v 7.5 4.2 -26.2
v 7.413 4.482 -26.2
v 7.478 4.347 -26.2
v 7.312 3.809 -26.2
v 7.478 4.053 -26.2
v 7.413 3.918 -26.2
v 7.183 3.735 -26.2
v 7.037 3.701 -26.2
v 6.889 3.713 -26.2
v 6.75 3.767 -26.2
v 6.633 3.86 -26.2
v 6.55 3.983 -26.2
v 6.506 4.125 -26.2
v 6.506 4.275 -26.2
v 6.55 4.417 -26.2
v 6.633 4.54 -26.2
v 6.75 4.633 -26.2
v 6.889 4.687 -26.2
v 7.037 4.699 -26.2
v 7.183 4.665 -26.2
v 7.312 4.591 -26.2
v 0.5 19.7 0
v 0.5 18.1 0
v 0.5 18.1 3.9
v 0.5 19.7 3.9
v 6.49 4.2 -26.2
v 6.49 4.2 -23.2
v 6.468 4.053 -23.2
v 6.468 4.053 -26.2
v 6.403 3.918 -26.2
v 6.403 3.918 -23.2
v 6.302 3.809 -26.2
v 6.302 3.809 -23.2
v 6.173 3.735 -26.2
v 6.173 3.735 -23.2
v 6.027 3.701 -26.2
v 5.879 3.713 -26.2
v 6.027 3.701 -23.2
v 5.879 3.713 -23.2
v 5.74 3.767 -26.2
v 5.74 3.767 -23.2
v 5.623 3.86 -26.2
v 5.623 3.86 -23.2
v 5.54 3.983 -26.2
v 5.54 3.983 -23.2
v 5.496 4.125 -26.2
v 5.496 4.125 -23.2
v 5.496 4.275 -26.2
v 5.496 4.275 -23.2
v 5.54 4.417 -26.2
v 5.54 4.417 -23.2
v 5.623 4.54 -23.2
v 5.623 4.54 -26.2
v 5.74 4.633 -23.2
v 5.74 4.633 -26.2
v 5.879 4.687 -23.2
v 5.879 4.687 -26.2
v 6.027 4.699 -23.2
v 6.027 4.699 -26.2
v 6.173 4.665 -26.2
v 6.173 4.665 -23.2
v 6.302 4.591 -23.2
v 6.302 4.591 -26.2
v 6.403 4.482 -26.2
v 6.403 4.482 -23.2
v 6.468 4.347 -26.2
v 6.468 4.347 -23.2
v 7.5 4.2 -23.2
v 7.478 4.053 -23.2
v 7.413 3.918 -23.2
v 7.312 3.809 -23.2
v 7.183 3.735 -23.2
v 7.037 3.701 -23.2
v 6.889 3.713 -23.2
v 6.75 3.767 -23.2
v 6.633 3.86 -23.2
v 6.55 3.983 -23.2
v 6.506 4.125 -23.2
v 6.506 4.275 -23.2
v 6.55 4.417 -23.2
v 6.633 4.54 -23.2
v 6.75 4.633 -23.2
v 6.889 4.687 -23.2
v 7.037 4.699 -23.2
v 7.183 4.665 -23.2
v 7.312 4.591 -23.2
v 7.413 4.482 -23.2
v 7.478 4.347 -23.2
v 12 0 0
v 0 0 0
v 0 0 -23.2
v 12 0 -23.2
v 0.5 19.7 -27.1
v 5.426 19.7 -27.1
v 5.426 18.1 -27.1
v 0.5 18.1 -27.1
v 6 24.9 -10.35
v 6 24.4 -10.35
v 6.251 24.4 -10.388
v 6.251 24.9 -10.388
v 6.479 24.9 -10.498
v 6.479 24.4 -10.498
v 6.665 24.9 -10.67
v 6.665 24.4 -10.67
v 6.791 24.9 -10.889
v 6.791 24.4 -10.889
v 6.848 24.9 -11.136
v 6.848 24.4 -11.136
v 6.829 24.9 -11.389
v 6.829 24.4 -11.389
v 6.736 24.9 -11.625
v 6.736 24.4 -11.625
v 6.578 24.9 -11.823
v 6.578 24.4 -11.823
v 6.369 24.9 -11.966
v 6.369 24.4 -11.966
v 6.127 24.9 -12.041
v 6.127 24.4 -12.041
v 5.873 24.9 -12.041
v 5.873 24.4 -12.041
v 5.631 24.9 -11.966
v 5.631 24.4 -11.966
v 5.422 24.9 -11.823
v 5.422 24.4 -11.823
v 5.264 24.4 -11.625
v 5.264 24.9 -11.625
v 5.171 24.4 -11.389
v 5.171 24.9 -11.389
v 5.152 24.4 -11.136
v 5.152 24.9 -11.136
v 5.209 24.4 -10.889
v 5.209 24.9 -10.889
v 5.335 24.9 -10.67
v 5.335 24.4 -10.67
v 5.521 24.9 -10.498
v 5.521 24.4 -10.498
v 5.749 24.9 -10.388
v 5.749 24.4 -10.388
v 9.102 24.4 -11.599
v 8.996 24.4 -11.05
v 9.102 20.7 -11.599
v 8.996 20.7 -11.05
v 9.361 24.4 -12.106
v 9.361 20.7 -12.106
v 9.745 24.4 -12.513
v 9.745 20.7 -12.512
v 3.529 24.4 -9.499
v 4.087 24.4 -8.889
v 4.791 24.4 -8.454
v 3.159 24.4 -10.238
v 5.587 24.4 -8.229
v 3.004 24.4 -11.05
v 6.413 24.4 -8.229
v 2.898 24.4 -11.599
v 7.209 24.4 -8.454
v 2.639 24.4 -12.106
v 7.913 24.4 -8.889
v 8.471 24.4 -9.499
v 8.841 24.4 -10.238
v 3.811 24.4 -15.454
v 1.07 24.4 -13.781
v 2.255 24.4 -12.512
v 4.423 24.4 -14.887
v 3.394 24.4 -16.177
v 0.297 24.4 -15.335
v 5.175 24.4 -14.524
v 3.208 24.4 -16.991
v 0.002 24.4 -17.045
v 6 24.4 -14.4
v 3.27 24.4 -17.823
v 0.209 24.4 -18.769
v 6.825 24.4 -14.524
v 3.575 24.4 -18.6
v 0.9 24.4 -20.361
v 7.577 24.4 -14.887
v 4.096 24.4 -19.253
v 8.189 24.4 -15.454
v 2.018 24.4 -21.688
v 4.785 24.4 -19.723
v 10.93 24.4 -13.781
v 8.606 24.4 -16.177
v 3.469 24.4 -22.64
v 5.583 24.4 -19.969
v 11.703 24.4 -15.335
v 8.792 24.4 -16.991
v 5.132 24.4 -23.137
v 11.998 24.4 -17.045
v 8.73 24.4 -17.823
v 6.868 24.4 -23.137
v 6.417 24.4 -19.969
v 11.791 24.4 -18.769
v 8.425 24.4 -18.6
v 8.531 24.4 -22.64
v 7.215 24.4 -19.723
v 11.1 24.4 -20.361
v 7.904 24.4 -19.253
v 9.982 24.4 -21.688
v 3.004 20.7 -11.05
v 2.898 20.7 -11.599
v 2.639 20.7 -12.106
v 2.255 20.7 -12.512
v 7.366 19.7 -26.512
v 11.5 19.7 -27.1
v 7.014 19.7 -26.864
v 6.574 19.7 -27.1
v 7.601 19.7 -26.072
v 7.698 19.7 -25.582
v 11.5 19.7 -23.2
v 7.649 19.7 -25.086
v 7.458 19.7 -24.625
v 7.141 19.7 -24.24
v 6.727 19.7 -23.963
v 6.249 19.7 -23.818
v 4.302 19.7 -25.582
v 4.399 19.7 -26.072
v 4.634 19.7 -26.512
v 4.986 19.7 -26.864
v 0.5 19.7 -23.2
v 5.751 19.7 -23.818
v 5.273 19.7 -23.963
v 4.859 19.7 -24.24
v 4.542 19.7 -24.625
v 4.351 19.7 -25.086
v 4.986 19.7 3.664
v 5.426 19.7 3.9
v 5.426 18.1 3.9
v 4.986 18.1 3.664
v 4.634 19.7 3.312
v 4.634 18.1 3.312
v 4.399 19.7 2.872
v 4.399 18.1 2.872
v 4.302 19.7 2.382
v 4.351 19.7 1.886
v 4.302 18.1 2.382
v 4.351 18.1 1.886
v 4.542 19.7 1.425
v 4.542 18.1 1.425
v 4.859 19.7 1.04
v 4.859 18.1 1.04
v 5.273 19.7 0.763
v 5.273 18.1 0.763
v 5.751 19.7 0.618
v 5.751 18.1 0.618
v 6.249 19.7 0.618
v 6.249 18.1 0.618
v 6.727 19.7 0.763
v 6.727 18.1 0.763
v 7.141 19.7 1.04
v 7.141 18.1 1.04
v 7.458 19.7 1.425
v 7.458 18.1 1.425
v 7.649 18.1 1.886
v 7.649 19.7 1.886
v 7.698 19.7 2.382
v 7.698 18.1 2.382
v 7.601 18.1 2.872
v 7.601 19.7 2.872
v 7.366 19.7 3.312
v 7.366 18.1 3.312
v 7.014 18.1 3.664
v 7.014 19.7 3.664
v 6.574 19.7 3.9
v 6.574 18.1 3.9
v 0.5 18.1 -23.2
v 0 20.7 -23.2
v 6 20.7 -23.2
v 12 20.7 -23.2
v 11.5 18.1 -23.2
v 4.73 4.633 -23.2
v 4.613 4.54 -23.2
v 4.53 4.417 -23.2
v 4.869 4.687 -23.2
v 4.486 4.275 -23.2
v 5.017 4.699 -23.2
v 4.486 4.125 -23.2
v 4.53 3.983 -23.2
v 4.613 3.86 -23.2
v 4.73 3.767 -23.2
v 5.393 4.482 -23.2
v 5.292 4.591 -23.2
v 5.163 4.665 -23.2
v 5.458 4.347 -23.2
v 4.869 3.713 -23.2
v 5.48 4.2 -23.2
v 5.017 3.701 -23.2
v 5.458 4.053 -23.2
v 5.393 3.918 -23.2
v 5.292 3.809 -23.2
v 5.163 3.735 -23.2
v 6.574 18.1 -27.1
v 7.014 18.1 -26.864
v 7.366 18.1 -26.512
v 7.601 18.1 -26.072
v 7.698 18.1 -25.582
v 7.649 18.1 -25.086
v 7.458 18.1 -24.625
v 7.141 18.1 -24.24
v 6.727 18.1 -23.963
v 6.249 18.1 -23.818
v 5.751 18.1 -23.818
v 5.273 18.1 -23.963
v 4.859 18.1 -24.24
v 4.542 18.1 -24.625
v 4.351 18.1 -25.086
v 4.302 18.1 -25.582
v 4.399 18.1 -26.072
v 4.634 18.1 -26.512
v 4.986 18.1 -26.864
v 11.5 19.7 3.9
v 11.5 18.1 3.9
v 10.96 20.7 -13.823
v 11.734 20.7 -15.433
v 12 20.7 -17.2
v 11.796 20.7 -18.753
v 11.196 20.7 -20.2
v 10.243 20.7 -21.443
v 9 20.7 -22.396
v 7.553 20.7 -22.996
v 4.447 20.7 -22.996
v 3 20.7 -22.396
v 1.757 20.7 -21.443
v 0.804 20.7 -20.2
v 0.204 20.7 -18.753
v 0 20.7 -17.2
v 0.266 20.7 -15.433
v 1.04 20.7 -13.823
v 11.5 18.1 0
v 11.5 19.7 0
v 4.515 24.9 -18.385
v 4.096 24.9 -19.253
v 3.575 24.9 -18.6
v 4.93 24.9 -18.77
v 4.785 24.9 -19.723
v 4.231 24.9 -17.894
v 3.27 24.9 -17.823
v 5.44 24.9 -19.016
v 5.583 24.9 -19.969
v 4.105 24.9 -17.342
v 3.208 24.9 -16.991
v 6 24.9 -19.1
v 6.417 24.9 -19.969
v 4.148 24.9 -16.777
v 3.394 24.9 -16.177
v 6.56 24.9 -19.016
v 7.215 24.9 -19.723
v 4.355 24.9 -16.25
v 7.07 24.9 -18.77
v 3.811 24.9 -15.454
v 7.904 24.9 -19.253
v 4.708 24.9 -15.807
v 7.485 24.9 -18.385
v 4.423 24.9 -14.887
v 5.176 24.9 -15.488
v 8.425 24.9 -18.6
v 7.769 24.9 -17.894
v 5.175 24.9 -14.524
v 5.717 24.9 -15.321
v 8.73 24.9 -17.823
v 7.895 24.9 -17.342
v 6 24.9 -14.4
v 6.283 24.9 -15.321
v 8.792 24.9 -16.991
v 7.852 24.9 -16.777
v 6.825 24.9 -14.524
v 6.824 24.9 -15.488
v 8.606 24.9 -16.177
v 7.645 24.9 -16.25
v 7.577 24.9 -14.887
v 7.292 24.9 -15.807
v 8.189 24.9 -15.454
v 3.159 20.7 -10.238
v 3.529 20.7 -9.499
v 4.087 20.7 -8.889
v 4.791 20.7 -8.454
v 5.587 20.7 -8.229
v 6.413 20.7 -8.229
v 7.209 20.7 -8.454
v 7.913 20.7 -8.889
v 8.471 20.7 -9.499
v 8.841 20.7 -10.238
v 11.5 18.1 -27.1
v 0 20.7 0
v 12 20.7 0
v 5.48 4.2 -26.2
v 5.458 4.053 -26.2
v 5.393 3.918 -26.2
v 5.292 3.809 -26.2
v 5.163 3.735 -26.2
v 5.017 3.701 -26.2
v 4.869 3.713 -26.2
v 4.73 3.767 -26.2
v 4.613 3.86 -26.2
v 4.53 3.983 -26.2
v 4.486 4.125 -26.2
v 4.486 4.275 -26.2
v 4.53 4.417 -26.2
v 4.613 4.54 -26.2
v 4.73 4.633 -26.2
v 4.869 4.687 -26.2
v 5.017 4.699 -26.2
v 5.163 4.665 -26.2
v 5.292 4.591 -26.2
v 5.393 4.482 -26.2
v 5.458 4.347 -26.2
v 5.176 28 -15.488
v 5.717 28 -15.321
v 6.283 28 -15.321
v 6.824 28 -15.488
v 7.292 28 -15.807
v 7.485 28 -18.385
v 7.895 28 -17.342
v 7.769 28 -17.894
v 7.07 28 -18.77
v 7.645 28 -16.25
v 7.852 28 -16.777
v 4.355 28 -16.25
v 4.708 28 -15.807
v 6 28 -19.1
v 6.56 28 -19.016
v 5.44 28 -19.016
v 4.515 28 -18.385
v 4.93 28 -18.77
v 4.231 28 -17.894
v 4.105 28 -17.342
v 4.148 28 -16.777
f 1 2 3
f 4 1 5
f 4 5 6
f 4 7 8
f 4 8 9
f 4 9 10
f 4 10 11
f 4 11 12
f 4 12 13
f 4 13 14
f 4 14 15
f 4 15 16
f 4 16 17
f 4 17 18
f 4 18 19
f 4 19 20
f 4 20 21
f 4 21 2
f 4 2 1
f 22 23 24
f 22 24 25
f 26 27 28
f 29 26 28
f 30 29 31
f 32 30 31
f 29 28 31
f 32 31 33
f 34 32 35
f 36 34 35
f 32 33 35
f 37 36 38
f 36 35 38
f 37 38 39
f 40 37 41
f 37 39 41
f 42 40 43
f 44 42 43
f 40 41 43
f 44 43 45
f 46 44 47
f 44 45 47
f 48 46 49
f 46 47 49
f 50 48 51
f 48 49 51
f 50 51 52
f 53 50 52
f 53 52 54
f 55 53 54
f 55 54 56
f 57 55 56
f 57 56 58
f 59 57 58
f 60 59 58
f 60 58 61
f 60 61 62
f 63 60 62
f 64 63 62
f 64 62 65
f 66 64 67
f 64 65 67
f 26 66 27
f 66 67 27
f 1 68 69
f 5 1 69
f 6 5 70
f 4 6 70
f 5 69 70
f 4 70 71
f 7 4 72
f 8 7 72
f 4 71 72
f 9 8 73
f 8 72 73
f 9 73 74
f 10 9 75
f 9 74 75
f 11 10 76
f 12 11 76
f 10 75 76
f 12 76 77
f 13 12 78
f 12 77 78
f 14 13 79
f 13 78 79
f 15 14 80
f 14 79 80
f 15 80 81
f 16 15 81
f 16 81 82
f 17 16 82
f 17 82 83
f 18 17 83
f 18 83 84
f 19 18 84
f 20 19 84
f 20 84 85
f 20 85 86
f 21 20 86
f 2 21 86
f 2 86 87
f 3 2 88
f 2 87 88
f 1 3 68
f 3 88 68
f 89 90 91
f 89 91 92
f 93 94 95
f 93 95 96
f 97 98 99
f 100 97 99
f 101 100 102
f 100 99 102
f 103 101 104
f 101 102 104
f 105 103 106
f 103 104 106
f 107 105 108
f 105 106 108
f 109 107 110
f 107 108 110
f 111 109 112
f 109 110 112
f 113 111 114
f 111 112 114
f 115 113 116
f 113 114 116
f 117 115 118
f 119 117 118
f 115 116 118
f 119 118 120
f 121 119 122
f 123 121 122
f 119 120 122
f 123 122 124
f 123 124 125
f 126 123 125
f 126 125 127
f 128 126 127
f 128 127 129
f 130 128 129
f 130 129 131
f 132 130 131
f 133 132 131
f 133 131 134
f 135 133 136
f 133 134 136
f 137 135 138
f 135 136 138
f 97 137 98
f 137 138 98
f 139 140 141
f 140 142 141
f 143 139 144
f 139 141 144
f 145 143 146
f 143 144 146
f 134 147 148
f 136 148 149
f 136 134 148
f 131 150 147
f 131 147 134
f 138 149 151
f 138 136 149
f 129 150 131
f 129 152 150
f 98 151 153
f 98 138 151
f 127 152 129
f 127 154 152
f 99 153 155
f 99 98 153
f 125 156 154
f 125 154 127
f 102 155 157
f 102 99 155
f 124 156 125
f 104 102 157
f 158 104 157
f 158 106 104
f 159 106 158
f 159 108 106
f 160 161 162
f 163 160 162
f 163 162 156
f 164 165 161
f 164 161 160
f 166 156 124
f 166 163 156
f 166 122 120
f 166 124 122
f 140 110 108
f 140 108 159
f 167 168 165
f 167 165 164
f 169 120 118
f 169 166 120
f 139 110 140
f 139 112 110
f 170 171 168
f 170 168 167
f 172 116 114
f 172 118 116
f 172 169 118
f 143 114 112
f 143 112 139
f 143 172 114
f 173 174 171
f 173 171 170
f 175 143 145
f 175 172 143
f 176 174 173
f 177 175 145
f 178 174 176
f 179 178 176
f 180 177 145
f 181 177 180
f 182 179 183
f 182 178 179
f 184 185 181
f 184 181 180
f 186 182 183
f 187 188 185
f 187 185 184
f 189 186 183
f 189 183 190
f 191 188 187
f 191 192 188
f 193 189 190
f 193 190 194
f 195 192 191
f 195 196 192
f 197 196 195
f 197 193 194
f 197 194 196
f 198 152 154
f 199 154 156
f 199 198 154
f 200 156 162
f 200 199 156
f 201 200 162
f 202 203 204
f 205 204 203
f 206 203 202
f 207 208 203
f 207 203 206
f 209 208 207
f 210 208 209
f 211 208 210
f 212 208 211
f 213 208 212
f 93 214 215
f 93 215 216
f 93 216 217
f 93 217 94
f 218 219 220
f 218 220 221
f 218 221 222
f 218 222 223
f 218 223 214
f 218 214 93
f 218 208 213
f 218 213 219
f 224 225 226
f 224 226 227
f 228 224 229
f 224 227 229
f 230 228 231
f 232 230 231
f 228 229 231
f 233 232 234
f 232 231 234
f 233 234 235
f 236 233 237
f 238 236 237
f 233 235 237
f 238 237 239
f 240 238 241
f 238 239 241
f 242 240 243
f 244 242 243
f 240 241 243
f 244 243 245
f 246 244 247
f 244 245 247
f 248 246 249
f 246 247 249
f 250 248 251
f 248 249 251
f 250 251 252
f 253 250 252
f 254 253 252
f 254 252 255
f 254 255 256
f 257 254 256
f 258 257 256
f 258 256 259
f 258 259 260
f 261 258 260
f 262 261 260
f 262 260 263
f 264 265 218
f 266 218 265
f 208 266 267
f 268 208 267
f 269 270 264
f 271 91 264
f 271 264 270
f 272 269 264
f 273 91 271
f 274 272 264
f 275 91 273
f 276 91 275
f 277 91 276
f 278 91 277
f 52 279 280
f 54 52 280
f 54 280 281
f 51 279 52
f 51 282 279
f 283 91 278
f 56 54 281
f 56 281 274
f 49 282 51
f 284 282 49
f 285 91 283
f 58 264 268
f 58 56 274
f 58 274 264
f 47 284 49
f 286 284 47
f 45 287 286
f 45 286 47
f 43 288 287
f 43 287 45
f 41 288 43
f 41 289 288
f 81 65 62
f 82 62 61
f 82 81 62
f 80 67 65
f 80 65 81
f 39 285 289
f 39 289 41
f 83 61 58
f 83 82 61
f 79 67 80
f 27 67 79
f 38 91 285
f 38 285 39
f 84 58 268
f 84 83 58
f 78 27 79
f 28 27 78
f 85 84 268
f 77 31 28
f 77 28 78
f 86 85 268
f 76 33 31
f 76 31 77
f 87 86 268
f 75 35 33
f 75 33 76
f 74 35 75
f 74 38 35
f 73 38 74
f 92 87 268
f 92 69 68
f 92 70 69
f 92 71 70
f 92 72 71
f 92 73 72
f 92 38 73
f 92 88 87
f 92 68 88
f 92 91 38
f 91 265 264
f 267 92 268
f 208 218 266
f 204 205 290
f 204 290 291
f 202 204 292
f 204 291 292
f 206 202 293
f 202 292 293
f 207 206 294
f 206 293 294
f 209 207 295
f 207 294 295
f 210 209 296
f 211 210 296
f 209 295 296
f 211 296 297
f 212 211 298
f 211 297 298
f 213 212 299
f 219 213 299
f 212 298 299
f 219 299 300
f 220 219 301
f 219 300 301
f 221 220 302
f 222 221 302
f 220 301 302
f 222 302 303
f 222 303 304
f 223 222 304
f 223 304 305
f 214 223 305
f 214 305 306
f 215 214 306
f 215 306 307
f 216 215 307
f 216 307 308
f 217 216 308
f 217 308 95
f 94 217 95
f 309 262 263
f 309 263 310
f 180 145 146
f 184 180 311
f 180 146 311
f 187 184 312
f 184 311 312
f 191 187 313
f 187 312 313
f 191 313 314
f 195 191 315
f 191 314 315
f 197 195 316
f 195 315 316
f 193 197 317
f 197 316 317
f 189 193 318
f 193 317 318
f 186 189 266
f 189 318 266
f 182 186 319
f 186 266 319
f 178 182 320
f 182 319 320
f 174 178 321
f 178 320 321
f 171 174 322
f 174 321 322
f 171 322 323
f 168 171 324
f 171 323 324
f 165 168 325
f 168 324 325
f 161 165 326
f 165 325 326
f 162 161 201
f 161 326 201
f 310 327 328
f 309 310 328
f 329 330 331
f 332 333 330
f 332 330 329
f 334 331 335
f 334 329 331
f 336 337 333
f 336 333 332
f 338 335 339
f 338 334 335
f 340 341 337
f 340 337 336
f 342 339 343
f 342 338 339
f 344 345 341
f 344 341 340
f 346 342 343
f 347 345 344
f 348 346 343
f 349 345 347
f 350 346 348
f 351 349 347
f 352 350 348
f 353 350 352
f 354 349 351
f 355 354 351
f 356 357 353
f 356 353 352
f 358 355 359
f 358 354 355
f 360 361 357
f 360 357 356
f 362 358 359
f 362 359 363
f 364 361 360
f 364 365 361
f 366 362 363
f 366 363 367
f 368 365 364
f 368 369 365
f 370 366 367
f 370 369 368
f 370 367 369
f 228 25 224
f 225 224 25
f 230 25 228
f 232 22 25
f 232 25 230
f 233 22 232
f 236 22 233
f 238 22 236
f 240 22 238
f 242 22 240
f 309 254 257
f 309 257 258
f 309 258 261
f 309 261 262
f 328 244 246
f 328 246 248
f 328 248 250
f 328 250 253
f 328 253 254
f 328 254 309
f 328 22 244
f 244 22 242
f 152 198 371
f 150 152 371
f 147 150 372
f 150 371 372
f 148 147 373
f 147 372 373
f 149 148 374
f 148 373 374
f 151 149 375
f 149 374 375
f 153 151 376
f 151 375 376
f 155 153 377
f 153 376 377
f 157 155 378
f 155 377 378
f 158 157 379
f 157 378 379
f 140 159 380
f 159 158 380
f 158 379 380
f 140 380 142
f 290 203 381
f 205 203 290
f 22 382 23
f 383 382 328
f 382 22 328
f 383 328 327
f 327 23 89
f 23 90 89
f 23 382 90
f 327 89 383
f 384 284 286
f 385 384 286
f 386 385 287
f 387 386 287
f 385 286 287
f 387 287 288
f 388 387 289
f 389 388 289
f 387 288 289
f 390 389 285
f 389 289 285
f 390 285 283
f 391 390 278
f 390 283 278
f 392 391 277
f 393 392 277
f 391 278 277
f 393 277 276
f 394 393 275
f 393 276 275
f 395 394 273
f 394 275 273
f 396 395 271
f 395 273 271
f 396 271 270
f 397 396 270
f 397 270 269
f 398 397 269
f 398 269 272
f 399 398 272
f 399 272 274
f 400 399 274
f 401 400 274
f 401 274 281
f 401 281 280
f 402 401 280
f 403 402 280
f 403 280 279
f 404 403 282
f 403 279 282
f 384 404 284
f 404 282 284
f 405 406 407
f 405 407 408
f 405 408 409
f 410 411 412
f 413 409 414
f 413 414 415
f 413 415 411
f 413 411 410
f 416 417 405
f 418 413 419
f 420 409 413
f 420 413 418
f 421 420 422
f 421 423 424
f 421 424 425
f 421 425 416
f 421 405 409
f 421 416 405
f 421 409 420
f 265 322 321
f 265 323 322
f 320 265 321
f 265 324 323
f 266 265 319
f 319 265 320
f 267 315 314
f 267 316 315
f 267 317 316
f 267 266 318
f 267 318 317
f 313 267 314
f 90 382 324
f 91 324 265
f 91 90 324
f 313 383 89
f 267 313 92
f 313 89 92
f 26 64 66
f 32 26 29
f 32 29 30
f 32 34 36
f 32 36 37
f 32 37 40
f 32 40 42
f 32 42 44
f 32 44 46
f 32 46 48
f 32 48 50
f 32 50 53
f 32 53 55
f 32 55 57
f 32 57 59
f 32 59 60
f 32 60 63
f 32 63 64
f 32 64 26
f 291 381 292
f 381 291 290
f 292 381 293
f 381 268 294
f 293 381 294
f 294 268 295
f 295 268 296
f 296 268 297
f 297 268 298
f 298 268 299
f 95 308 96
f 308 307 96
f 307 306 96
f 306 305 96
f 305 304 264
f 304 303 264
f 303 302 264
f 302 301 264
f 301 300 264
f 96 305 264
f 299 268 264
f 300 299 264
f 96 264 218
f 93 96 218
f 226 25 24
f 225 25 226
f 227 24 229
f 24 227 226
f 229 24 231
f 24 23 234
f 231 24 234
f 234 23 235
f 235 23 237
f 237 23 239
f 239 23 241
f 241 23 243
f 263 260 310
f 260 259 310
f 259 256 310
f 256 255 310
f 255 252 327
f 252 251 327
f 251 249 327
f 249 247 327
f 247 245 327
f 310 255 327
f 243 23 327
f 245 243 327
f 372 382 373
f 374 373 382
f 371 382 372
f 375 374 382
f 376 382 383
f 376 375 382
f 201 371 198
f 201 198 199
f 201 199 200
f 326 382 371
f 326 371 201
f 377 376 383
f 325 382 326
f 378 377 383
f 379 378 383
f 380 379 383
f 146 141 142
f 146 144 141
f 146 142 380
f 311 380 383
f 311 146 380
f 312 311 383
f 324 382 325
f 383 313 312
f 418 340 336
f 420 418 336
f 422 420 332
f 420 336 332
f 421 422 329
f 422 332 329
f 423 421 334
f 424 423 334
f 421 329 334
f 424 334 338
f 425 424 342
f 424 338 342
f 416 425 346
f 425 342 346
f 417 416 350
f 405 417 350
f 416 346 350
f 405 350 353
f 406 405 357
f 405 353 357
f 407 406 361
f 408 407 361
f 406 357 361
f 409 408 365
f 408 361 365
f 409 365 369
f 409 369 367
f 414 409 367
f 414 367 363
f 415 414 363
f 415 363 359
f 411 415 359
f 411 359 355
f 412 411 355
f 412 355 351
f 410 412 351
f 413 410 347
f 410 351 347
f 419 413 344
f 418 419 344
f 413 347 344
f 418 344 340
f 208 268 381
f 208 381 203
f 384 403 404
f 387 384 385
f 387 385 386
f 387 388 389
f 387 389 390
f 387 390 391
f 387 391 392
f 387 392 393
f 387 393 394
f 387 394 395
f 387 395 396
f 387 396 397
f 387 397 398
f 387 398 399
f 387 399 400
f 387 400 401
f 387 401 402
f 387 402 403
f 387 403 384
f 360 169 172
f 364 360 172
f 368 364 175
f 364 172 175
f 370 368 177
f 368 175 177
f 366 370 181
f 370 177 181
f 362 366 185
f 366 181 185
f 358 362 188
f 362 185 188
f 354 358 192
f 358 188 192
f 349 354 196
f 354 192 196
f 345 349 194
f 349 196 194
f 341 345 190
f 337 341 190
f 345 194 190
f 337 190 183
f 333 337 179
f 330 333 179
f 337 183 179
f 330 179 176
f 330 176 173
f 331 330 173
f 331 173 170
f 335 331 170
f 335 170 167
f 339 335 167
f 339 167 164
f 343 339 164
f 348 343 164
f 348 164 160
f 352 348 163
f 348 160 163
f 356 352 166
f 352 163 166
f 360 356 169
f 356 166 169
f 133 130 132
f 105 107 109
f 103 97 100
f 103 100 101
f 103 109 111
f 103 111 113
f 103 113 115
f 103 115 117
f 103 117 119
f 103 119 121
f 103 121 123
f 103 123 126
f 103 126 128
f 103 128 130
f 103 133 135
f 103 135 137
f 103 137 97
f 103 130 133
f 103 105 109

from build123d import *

# Parameters (mm, degrees)
SKETCH1_W                = 12
SKETCH1_H                = 23.2
BOSS_EXTRUDE1_DEPTH      = 20.7
SKETCH2_W                = 11
SKETCH2_H                = 1.6
BOSS_EXTRUDE2_DEPTH      = 3.9
SKETCH3_W                = 11
SKETCH3_H                = 1.6
BOSS_EXTRUDE3_DEPTH      = 3.9
SKETCH4_R                = 6
BOSS_EXTRUDE4_DEPTH      = 3.7
SKETCH5_R                = 3
BOSS_EXTRUDE5_DEPTH      = 3.7
FILLET1_R                = 2
SKETCH6_R                = 0.85
BOSS_EXTRUDE6_DEPTH      = 0.5
SKETCH7_R                = 2.8
BOSS_EXTRUDE7_DEPTH      = 0.5
SKETCH8_R                = 1.9
BOSS_EXTRUDE8_DEPTH      = 3.1
M3_CLEARANCE_HOLE1_D     = 3.4
M3_CLEARANCE_HOLE1_DEPTH = 3
M3_CLEARANCE_HOLE1_TIP   = 1.021463052
SKETCH11_R               = 0.5
BOSS_EXTRUDE9_DEPTH      = 3
LPATTERN2_COUNT          = 3
LPATTERN2_PITCH          = 1.01


with BuildPart() as part:
    # Sketch1 → Boss-Extrude1 (new body)
    with BuildSketch(Plane(origin=(0, 0, 0), x_dir=(1, 0, 0), z_dir=(0, 1, 0))):
        with Locations((6, 11.6)):
            Rectangle(SKETCH1_W, SKETCH1_H)
    extrude(amount=BOSS_EXTRUDE1_DEPTH)

    # Sketch2 → Boss-Extrude2 (add)
    with BuildSketch(Plane.XY):
        with Locations((6, 18.9)):
            Rectangle(SKETCH2_W, SKETCH2_H)
    extrude(amount=BOSS_EXTRUDE2_DEPTH)

    # Sketch3 → Boss-Extrude3 (add)
    with BuildSketch(Plane(origin=(0, 0, -23.2), x_dir=(-1, 0, 0), z_dir=(0, 0, -1))):
        with Locations((-6, 18.9)):
            Rectangle(SKETCH3_W, SKETCH3_H)
    extrude(amount=BOSS_EXTRUDE3_DEPTH)

    # Sketch4 → Boss-Extrude4 (add)
    with BuildSketch(Plane(origin=(0, 20.7, 0), x_dir=(1, 0, 0), z_dir=(0, 1, 0))):
        with Locations(Location((6, 17.2, 0), (0, 0, 90))):
            Circle(SKETCH4_R)
    extrude(amount=BOSS_EXTRUDE4_DEPTH)

    # Sketch5 → Boss-Extrude5 (add)
    with BuildSketch(Plane(origin=(0, 20.7, 0), x_dir=(1, 0, 0), z_dir=(0, 1, 0))):
        with Locations((6, 11.2)):
            Circle(SKETCH5_R)
    extrude(amount=BOSS_EXTRUDE5_DEPTH)

    # Fillet1
    fillet1_edges = [part.edges().sort_by_distance(p)[0] for p in [
        (3.09526249, 22.55, -11.95),
        (8.90473751, 22.55, -11.95),
    ]]
    fillet(fillet1_edges, radius=FILLET1_R)

    # Sketch6 → Boss-Extrude6 (add)
    with BuildSketch(Plane(origin=(0, 24.4, 0), x_dir=(1, 0, 0), z_dir=(0, 1, 0))):
        with Locations(Location((6, 11.2, 0), (0, 0, 270))):
            Circle(SKETCH6_R)
    extrude(amount=BOSS_EXTRUDE6_DEPTH)

    # Sketch7 → Boss-Extrude7 (add)
    with BuildSketch(Plane(origin=(0, 24.4, 0), x_dir=(1, 0, 0), z_dir=(0, 1, 0))):
        with Locations(Location((6, 17.2, 0), (0, 0, 270))):
            Circle(SKETCH7_R)
    extrude(amount=BOSS_EXTRUDE7_DEPTH)

    # Sketch8 → Boss-Extrude8 (add)
    with BuildSketch(Plane(origin=(0, 24.9, 0), x_dir=(1, 0, 0), z_dir=(0, 1, 0))):
        with Locations(Location((6, 17.2, 0), (0, 0, 90))):
            Circle(SKETCH8_R)
    extrude(amount=BOSS_EXTRUDE8_DEPTH)

    # M3 Clearance Hole1
    with Locations(Plane(origin=(0, 19.7, 0), x_dir=(1, 0, 0), z_dir=(0, 1, 0))):
        with Locations((6, -2.3), (6, 25.5)):
            Hole(M3_CLEARANCE_HOLE1_D / 2, depth=M3_CLEARANCE_HOLE1_DEPTH)
            with Locations((0, 0, -(M3_CLEARANCE_HOLE1_DEPTH + M3_CLEARANCE_HOLE1_TIP / 2))):  # 118° drill point
                Cone(0, M3_CLEARANCE_HOLE1_D / 2, M3_CLEARANCE_HOLE1_TIP, mode=Mode.SUBTRACT)

    # Sketch11 → Boss-Extrude9 (add)
    with BuildSketch(Plane(origin=(0, 0, -23.2), x_dir=(-1, 0, 0), z_dir=(0, 0, -1))):
        with Locations(Location((-7, 4.2, 0), (0, 0, 180))):
            Circle(SKETCH11_R)
    boss_extrude9 = extrude(amount=BOSS_EXTRUDE9_DEPTH)

    # LPattern2: Boss-Extrude9 ×3
    with Locations(*[(-i * LPATTERN2_PITCH, 0, 0) for i in range(1, LPATTERN2_COUNT)]):
        add(boss_extrude9)


solid = part.part
